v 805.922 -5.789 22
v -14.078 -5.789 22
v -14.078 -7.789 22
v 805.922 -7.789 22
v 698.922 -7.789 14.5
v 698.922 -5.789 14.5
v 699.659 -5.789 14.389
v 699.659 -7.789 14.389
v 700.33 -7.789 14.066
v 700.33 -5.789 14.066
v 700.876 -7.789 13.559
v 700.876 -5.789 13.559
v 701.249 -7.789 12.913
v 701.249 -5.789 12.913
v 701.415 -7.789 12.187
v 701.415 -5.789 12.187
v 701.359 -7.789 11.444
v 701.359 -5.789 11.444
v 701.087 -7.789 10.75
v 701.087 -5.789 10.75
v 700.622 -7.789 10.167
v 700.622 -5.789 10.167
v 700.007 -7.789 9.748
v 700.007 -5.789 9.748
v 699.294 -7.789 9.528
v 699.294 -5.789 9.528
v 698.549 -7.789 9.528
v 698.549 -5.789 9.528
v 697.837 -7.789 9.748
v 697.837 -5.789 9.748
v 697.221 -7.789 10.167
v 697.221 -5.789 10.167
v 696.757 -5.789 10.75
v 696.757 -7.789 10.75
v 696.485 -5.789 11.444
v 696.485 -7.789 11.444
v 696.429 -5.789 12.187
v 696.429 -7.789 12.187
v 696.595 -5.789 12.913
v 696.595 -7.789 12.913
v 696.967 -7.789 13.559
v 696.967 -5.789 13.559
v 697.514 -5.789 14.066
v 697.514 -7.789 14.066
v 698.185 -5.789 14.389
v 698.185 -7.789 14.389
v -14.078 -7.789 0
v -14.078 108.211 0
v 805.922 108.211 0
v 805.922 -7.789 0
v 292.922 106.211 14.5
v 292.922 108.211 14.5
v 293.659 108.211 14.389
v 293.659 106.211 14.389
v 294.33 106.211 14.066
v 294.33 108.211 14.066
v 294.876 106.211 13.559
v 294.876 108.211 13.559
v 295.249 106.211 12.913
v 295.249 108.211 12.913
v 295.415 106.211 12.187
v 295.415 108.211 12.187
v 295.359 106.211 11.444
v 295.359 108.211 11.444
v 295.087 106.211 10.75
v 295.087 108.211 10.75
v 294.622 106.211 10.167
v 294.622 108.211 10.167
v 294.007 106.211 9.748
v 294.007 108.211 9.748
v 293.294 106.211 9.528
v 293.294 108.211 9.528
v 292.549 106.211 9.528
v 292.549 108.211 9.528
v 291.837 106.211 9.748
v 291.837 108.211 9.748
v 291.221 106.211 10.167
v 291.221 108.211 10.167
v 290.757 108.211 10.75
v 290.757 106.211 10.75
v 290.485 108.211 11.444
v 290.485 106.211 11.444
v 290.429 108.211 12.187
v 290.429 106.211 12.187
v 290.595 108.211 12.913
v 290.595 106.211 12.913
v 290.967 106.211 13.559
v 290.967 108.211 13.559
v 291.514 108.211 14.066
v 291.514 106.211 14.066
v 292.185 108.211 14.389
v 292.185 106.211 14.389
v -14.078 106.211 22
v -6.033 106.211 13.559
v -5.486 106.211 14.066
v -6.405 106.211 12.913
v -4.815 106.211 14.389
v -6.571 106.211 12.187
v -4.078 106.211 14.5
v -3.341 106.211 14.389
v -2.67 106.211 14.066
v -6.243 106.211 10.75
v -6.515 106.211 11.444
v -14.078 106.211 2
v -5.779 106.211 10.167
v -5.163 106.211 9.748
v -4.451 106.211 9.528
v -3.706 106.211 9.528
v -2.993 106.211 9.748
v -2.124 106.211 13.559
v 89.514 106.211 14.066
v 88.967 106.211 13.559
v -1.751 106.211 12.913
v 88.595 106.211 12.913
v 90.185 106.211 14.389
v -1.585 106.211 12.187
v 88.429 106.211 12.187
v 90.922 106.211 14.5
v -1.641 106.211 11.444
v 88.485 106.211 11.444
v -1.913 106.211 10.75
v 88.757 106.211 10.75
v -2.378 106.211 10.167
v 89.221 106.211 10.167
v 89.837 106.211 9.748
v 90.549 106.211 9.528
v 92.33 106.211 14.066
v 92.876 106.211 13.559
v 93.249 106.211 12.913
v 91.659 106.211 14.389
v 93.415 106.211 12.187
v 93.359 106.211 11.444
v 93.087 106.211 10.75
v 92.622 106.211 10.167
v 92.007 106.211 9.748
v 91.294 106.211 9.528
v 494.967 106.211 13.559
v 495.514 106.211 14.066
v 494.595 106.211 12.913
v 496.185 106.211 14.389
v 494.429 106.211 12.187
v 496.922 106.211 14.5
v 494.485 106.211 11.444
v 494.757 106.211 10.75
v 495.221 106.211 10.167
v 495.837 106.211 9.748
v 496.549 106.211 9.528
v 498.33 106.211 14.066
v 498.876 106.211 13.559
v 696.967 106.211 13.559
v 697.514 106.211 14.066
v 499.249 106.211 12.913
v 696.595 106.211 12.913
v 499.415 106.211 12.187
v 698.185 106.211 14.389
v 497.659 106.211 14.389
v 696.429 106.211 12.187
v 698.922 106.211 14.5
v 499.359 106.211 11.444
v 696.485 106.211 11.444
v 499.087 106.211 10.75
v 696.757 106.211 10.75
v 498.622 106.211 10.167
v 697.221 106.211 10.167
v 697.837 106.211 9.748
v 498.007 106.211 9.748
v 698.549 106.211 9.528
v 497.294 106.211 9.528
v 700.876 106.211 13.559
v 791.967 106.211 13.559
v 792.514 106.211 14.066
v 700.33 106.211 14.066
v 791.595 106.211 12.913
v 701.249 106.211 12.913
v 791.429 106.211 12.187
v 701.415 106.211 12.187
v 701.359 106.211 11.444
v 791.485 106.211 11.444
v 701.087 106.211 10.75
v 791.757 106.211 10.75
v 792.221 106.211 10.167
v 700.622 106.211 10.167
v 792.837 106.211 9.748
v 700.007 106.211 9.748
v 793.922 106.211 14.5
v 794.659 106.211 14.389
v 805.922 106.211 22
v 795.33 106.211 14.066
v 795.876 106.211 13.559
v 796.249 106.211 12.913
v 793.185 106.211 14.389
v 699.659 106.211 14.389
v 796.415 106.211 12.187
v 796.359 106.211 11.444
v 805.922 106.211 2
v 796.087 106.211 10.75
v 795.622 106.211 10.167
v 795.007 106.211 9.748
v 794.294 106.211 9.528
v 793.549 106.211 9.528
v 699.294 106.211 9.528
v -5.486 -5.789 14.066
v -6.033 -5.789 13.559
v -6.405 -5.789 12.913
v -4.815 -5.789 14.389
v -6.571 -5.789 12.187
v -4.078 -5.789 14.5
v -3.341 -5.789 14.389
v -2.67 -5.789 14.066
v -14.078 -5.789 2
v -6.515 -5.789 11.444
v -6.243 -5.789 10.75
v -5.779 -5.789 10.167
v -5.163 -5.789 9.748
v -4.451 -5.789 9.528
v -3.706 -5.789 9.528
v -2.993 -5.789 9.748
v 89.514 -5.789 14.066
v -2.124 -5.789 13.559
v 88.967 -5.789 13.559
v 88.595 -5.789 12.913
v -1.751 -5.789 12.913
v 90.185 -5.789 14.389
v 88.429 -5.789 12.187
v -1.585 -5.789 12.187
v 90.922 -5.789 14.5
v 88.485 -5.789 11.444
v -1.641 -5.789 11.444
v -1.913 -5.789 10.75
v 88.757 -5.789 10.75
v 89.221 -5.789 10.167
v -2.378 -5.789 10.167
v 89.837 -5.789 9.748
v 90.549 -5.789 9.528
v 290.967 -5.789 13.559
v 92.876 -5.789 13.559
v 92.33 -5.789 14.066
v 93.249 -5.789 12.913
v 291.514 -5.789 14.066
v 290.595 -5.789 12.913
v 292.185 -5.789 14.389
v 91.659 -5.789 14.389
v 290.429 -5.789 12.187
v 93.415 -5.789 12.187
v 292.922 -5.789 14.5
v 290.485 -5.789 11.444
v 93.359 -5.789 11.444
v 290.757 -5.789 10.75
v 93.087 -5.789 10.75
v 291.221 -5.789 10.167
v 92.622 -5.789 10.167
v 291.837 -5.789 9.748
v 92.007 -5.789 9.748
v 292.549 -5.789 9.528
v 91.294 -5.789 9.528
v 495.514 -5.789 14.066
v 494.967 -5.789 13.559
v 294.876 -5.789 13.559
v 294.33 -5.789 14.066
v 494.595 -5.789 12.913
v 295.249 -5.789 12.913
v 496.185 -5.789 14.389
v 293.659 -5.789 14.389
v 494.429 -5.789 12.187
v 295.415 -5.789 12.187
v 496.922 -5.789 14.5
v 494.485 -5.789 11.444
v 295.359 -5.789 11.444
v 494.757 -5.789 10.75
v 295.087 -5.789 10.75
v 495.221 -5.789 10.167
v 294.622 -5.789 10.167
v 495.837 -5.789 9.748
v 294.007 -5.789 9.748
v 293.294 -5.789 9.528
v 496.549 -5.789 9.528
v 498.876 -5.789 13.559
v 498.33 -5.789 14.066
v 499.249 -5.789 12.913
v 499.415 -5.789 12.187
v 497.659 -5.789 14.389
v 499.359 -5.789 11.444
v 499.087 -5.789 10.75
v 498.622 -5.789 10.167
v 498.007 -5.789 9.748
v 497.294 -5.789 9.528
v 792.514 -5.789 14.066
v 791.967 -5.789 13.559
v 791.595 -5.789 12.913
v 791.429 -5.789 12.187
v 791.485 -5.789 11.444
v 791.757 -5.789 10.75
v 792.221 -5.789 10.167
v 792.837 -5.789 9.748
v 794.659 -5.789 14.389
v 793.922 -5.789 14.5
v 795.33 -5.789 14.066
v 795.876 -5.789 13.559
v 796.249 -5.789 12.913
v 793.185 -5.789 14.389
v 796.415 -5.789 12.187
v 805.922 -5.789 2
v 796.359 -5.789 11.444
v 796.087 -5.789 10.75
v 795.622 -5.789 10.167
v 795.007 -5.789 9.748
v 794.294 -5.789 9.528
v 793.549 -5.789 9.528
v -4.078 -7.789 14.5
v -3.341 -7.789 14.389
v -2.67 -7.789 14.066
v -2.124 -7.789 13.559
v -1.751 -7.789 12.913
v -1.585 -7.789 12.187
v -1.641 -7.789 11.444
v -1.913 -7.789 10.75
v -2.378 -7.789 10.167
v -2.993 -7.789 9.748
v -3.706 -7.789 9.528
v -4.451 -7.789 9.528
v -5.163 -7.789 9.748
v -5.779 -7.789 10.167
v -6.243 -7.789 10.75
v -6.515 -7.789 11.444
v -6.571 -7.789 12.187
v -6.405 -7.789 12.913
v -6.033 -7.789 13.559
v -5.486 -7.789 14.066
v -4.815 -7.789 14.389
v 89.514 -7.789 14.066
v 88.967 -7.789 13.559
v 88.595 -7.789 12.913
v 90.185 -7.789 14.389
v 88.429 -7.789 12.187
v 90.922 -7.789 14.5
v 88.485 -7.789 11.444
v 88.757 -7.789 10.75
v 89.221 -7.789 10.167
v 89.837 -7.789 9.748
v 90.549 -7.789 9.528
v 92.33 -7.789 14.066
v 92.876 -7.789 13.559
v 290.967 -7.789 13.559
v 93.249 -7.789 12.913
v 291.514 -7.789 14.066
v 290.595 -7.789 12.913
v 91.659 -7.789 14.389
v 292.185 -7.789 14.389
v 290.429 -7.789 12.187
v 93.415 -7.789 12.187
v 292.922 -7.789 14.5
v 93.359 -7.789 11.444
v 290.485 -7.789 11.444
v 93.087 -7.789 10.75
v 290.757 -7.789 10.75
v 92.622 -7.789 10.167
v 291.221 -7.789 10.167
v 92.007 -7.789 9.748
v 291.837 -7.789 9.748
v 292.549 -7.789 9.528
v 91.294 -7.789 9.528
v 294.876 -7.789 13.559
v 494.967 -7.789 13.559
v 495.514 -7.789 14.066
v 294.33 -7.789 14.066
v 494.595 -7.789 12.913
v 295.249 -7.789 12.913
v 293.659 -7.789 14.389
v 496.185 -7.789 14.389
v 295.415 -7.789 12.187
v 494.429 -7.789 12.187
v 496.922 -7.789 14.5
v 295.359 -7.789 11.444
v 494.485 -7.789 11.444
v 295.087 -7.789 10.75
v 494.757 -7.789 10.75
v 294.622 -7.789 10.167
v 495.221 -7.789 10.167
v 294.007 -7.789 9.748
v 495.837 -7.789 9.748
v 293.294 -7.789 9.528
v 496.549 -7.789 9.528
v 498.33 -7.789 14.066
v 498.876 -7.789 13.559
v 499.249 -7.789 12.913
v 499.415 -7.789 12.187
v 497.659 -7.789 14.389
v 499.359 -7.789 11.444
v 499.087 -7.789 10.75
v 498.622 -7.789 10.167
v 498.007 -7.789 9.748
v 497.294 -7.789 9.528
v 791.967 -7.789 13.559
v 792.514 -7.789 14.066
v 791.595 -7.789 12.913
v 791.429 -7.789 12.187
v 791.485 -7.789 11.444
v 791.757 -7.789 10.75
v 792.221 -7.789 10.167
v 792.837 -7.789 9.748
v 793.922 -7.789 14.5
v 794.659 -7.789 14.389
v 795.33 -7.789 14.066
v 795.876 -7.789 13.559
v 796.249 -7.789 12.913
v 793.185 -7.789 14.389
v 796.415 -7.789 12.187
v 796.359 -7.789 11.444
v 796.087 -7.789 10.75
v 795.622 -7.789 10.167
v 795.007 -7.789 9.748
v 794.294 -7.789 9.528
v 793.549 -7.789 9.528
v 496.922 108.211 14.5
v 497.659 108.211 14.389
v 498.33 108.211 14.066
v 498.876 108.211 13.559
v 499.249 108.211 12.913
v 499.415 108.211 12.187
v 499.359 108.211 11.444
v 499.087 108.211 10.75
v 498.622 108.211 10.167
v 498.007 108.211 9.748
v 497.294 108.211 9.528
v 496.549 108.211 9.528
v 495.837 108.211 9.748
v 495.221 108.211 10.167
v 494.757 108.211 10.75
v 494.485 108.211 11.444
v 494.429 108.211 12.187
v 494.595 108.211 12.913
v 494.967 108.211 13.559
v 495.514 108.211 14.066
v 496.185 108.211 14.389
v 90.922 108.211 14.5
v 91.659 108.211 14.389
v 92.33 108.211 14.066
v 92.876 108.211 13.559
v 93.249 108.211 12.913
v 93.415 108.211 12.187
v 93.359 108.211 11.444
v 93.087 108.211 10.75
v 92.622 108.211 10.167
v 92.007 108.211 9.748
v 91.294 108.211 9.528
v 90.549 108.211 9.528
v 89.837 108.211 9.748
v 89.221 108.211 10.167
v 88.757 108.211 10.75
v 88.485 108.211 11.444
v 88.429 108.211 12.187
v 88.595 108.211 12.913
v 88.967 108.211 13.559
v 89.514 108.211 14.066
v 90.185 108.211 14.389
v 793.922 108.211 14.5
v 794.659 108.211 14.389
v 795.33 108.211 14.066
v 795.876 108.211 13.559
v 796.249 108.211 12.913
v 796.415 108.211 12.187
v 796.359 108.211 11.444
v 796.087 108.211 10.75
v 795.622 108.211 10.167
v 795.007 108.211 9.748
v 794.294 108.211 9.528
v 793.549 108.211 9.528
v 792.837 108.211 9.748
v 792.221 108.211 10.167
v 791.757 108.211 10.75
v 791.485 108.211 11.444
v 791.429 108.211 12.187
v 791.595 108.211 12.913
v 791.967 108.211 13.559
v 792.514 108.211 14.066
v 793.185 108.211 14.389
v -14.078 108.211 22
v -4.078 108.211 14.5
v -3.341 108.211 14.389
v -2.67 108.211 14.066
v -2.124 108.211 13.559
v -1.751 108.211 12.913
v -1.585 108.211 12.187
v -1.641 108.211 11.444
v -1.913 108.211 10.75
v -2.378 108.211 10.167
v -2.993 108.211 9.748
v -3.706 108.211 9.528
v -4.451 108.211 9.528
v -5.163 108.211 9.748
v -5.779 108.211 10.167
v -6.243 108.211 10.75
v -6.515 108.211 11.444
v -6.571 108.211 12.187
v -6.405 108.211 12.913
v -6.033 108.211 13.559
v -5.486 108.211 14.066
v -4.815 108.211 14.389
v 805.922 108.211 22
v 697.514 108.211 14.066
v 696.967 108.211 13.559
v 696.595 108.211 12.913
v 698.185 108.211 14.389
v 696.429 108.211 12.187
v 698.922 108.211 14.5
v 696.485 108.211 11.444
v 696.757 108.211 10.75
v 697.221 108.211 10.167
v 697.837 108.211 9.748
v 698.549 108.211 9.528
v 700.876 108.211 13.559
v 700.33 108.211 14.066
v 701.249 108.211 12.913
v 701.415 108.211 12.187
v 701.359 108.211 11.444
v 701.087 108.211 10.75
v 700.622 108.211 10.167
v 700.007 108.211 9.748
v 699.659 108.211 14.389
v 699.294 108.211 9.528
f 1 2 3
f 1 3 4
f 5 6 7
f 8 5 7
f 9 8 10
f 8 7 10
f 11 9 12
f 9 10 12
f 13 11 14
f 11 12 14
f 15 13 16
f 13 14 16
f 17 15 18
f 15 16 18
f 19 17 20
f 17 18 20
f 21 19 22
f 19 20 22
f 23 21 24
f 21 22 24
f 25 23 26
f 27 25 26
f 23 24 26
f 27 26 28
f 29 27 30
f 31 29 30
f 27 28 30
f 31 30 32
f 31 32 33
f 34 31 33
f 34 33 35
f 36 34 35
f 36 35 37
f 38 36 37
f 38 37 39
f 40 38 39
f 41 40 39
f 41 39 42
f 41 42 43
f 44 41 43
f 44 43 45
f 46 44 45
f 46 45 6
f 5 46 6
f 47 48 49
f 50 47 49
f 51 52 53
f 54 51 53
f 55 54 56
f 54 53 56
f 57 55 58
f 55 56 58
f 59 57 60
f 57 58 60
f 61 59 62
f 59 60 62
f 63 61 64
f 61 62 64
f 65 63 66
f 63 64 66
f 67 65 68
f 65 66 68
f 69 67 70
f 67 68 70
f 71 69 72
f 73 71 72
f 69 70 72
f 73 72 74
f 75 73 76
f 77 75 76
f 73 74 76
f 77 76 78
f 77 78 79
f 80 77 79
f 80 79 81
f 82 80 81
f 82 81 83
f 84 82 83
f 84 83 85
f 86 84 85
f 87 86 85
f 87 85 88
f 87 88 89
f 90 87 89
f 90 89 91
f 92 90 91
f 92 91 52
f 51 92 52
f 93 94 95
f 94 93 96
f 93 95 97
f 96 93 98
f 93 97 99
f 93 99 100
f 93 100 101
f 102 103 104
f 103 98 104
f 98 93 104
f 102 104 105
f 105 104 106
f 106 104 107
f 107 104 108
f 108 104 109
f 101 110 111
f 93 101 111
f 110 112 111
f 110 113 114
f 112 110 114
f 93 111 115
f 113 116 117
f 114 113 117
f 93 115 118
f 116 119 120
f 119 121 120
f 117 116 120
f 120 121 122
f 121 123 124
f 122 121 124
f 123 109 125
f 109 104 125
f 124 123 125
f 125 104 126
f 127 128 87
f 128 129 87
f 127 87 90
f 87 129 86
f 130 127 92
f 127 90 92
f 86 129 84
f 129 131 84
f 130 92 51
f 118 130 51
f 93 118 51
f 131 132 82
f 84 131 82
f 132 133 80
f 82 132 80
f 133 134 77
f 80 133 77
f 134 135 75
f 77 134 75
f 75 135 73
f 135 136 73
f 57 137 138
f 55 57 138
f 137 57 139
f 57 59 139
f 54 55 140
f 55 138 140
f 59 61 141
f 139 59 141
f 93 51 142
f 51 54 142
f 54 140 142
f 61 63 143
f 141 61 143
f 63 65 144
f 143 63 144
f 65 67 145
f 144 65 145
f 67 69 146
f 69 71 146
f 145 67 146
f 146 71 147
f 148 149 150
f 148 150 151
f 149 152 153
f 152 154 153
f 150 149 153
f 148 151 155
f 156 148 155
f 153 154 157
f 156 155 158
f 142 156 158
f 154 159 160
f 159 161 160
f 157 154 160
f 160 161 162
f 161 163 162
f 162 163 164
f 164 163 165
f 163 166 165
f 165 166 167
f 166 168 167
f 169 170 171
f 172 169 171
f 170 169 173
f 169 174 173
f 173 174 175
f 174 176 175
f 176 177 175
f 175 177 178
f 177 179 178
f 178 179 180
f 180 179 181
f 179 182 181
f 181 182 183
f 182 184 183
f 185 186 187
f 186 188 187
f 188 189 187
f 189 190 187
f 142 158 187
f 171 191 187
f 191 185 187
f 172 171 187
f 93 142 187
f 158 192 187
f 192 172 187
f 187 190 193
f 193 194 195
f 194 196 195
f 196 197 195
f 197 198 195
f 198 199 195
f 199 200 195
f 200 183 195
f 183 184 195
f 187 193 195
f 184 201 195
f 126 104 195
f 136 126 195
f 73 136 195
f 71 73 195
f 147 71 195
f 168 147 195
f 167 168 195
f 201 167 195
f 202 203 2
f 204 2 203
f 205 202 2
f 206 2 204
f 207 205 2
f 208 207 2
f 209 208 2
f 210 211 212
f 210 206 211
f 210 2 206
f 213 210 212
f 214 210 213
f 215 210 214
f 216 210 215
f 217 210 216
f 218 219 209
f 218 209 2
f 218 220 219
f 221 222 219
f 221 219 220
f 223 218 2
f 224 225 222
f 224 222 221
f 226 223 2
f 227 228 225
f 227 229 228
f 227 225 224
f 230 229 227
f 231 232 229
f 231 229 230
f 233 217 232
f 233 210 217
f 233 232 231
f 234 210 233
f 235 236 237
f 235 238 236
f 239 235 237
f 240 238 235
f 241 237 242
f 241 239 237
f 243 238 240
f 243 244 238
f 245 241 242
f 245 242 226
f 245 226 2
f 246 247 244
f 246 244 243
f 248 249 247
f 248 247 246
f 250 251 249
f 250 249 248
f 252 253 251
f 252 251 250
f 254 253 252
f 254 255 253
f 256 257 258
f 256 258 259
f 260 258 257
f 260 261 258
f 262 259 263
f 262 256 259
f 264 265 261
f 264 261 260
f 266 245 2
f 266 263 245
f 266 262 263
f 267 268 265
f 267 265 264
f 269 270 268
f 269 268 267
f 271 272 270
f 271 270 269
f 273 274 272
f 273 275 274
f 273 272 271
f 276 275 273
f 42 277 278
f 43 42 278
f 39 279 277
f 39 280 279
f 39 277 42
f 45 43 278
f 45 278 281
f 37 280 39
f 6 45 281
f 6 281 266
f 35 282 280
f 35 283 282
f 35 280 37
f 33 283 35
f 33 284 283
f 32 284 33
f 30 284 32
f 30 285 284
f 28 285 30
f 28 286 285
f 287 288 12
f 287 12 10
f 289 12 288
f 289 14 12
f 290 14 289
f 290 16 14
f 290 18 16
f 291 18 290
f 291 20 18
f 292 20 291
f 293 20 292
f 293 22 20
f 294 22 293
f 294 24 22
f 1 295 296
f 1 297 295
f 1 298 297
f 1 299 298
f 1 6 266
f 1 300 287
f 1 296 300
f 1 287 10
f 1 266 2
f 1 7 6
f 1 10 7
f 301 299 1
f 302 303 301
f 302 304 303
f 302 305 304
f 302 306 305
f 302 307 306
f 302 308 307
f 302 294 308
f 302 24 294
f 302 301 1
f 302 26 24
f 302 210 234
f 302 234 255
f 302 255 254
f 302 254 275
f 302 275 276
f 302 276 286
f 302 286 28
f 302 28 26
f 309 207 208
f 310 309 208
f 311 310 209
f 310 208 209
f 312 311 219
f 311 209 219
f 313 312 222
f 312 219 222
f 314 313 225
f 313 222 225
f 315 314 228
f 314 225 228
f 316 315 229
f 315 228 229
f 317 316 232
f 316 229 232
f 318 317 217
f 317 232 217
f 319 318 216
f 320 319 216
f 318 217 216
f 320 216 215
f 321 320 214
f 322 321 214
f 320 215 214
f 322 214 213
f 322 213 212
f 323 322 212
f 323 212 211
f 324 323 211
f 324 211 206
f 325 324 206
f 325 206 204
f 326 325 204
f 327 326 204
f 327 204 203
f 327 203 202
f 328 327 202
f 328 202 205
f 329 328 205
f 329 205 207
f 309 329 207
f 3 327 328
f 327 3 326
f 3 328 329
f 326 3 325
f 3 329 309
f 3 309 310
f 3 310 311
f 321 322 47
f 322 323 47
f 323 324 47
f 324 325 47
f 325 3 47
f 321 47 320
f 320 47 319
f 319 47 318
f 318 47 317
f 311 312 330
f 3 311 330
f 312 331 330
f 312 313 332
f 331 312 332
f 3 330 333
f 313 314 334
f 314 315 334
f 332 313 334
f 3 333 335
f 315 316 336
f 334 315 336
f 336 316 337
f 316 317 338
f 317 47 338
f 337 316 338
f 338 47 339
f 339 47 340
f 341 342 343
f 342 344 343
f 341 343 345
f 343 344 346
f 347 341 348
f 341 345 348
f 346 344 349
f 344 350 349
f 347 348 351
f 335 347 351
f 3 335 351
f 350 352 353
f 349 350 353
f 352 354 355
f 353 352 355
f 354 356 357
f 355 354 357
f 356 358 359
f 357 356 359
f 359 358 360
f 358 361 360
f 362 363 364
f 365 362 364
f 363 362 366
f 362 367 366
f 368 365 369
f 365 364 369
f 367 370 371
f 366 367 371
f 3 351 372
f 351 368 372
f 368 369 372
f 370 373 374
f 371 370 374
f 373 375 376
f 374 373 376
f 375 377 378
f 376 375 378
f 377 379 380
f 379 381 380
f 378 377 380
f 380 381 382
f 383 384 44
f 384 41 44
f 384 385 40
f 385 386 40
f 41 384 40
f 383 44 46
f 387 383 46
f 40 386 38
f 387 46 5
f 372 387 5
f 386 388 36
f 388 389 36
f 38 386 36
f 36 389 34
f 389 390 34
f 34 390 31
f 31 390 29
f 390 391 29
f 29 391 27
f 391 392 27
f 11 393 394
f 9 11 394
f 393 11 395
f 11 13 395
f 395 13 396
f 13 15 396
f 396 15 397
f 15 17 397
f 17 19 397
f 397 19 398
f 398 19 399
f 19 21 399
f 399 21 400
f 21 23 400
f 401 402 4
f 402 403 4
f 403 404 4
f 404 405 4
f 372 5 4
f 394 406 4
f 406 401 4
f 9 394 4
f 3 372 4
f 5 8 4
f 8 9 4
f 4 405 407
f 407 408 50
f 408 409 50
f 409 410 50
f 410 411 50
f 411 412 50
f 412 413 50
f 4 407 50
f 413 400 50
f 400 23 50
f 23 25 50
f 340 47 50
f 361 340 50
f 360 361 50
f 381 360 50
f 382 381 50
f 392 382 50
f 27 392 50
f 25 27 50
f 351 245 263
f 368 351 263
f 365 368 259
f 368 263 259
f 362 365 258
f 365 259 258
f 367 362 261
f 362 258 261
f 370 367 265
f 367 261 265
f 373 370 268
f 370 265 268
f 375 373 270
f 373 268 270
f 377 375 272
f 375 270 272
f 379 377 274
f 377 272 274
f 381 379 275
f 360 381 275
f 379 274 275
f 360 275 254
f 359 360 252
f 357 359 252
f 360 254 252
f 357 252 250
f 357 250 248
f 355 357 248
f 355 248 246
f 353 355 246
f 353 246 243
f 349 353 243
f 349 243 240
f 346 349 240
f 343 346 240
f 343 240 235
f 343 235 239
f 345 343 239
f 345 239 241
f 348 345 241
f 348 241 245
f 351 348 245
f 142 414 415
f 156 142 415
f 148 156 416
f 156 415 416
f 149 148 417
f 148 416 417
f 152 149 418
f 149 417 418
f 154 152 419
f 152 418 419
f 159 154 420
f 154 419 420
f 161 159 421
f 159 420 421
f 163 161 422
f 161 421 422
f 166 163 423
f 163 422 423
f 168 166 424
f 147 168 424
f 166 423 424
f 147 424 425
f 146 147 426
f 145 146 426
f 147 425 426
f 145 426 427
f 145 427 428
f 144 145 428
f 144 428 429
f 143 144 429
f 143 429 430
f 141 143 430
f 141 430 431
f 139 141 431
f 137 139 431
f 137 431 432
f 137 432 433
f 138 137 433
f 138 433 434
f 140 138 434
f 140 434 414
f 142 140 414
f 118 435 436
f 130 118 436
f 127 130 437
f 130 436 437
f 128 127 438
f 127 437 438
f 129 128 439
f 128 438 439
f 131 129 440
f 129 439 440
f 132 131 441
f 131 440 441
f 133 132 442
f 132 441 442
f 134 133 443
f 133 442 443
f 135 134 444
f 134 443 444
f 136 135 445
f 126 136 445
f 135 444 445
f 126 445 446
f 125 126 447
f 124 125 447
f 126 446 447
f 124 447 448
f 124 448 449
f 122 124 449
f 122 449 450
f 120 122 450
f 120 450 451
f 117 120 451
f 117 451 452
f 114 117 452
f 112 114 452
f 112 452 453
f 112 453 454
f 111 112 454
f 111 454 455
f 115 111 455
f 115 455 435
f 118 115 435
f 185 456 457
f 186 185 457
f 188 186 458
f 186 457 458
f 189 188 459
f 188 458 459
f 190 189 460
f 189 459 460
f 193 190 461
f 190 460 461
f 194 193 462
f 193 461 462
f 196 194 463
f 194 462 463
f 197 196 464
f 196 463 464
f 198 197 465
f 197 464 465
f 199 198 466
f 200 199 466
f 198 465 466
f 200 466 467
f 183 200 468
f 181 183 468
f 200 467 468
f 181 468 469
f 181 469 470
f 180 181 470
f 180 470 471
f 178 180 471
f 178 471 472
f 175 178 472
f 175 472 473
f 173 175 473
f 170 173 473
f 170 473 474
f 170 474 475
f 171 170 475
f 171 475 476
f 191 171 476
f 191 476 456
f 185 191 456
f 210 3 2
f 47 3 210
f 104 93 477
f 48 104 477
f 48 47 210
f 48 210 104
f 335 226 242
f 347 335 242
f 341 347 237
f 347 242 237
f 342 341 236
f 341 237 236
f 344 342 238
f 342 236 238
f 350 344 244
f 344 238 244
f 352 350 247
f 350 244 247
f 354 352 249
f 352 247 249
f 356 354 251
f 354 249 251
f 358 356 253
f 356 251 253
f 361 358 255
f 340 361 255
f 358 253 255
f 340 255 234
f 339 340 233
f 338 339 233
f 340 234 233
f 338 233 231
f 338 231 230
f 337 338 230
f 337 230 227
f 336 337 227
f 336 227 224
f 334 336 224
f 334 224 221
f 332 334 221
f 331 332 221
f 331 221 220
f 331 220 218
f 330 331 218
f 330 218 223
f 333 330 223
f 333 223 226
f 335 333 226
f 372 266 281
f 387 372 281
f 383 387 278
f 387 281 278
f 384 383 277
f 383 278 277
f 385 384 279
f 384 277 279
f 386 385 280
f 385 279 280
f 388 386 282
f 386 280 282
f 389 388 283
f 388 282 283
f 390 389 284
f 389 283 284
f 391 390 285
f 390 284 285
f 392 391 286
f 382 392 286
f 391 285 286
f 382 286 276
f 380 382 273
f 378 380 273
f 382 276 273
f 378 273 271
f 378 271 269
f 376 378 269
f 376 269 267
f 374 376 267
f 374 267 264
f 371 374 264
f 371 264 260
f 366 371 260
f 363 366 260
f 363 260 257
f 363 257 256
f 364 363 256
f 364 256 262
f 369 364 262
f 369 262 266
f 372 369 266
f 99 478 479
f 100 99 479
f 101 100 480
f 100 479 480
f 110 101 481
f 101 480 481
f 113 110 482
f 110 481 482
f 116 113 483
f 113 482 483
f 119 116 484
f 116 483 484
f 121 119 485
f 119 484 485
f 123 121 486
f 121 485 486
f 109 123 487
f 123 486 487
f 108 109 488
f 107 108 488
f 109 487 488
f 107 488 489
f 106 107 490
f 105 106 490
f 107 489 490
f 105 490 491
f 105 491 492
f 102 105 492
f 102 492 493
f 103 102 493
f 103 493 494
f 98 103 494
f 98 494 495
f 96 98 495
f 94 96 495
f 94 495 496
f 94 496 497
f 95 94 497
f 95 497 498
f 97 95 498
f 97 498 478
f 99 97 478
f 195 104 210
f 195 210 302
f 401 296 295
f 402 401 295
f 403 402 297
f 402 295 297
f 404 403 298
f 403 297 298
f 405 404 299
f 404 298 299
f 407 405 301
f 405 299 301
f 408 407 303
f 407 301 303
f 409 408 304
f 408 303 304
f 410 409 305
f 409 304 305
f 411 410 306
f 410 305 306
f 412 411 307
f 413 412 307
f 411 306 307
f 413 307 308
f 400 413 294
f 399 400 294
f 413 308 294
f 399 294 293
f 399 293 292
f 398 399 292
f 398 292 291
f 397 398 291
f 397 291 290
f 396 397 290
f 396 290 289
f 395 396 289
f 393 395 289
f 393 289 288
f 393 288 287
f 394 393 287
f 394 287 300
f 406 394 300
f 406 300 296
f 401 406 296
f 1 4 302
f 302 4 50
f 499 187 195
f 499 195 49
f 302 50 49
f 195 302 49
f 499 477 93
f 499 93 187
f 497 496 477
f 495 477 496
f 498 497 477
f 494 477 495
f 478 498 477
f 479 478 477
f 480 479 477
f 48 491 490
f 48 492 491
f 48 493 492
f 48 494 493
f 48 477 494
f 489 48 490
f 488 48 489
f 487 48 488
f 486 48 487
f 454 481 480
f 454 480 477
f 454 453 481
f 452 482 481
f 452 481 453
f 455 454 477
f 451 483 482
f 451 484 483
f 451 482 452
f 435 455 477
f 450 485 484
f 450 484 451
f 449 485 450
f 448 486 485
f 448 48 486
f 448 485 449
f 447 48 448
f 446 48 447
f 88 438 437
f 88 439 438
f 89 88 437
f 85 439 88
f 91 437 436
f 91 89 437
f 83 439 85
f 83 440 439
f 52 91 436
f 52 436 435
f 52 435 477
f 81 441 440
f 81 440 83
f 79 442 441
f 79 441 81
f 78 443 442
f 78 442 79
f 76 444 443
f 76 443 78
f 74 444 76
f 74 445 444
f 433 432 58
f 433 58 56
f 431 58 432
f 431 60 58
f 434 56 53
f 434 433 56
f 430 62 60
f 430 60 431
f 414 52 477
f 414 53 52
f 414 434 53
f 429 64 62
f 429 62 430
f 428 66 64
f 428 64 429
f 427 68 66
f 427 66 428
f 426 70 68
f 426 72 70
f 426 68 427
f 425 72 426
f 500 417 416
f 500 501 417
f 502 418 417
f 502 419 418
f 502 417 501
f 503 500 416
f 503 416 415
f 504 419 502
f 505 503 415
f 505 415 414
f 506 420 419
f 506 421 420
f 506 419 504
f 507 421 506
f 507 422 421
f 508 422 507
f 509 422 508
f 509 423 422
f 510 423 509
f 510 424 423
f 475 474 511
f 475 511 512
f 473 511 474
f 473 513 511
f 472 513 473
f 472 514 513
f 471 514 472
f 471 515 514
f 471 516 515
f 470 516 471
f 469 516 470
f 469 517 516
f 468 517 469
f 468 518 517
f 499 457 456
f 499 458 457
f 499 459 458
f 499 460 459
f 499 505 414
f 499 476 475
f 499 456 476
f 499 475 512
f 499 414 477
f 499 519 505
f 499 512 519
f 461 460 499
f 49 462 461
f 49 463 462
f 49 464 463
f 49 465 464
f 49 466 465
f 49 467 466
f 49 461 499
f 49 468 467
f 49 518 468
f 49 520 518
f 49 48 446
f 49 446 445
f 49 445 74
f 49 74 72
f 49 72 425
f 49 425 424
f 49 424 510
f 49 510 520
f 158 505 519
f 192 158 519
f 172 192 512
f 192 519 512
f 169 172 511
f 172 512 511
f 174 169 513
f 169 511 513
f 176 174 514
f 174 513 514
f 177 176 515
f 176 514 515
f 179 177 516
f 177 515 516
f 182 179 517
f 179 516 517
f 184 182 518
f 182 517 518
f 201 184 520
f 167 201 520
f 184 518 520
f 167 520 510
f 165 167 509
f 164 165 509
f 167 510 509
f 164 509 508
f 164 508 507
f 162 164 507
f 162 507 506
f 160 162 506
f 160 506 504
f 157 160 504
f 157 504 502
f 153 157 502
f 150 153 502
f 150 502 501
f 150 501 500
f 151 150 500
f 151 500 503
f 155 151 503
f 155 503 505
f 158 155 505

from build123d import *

# Parameters (mm, degrees)
SKETCH_1_W          = 820
SKETCH_1_H          = 116
EXTRUDE_1_DEPTH     = 2
SKETCH_2_W          = 820
SKETCH_2_H          = 2
EXTRUDE_2_DEPTH     = 20
SKETCH_3_R          = 2.5
CUT_EXTRUDE_2_DEPTH = 116


with BuildPart() as part:
    # 草图1 → 凸台-拉伸1 (new body)
    with BuildSketch(Plane.XY):
        with Locations((395.921840051, 50.211278088)):
            Rectangle(SKETCH_1_W, SKETCH_1_H)
    extrude(amount=EXTRUDE_1_DEPTH)

    # 草图2 → 凸台-拉伸2 (add)
    with BuildSketch(Plane.XY.offset(2)):
        with Locations((395.921840051, 107.211278088)):
            Rectangle(SKETCH_2_W, SKETCH_2_H)
        with Locations((395.921840051, -6.788721912)):
            Rectangle(SKETCH_2_W, SKETCH_2_H)
    extrude(amount=EXTRUDE_2_DEPTH)

    # 草图3 → 切除-拉伸2 (cut)
    with BuildSketch(Plane(origin=(0, 108.211278088, 0), x_dir=(1, 0, 0), z_dir=(0, 1, 0))):
        with Locations(Location((698.921840051, -12, 0), (0, 0, 270))):
            Circle(SKETCH_3_R)
        with Locations(Location((793.921840051, -12, 0), (0, 0, 270))):
            Circle(SKETCH_3_R)
        with Locations(Location((-4.078159949, -12, 0), (0, 0, 270))):
            Circle(SKETCH_3_R)
        with Locations(Location((90.921840051, -12, 0), (0, 0, 270))):
            Circle(SKETCH_3_R)
        with Locations(Location((292.921840051, -12, 0), (0, 0, 270))):
            Circle(SKETCH_3_R)
        with Locations(Location((496.921840051, -12, 0), (0, 0, 270))):
            Circle(SKETCH_3_R)
    extrude(amount=-CUT_EXTRUDE_2_DEPTH, mode=Mode.SUBTRACT)


solid = part.part
